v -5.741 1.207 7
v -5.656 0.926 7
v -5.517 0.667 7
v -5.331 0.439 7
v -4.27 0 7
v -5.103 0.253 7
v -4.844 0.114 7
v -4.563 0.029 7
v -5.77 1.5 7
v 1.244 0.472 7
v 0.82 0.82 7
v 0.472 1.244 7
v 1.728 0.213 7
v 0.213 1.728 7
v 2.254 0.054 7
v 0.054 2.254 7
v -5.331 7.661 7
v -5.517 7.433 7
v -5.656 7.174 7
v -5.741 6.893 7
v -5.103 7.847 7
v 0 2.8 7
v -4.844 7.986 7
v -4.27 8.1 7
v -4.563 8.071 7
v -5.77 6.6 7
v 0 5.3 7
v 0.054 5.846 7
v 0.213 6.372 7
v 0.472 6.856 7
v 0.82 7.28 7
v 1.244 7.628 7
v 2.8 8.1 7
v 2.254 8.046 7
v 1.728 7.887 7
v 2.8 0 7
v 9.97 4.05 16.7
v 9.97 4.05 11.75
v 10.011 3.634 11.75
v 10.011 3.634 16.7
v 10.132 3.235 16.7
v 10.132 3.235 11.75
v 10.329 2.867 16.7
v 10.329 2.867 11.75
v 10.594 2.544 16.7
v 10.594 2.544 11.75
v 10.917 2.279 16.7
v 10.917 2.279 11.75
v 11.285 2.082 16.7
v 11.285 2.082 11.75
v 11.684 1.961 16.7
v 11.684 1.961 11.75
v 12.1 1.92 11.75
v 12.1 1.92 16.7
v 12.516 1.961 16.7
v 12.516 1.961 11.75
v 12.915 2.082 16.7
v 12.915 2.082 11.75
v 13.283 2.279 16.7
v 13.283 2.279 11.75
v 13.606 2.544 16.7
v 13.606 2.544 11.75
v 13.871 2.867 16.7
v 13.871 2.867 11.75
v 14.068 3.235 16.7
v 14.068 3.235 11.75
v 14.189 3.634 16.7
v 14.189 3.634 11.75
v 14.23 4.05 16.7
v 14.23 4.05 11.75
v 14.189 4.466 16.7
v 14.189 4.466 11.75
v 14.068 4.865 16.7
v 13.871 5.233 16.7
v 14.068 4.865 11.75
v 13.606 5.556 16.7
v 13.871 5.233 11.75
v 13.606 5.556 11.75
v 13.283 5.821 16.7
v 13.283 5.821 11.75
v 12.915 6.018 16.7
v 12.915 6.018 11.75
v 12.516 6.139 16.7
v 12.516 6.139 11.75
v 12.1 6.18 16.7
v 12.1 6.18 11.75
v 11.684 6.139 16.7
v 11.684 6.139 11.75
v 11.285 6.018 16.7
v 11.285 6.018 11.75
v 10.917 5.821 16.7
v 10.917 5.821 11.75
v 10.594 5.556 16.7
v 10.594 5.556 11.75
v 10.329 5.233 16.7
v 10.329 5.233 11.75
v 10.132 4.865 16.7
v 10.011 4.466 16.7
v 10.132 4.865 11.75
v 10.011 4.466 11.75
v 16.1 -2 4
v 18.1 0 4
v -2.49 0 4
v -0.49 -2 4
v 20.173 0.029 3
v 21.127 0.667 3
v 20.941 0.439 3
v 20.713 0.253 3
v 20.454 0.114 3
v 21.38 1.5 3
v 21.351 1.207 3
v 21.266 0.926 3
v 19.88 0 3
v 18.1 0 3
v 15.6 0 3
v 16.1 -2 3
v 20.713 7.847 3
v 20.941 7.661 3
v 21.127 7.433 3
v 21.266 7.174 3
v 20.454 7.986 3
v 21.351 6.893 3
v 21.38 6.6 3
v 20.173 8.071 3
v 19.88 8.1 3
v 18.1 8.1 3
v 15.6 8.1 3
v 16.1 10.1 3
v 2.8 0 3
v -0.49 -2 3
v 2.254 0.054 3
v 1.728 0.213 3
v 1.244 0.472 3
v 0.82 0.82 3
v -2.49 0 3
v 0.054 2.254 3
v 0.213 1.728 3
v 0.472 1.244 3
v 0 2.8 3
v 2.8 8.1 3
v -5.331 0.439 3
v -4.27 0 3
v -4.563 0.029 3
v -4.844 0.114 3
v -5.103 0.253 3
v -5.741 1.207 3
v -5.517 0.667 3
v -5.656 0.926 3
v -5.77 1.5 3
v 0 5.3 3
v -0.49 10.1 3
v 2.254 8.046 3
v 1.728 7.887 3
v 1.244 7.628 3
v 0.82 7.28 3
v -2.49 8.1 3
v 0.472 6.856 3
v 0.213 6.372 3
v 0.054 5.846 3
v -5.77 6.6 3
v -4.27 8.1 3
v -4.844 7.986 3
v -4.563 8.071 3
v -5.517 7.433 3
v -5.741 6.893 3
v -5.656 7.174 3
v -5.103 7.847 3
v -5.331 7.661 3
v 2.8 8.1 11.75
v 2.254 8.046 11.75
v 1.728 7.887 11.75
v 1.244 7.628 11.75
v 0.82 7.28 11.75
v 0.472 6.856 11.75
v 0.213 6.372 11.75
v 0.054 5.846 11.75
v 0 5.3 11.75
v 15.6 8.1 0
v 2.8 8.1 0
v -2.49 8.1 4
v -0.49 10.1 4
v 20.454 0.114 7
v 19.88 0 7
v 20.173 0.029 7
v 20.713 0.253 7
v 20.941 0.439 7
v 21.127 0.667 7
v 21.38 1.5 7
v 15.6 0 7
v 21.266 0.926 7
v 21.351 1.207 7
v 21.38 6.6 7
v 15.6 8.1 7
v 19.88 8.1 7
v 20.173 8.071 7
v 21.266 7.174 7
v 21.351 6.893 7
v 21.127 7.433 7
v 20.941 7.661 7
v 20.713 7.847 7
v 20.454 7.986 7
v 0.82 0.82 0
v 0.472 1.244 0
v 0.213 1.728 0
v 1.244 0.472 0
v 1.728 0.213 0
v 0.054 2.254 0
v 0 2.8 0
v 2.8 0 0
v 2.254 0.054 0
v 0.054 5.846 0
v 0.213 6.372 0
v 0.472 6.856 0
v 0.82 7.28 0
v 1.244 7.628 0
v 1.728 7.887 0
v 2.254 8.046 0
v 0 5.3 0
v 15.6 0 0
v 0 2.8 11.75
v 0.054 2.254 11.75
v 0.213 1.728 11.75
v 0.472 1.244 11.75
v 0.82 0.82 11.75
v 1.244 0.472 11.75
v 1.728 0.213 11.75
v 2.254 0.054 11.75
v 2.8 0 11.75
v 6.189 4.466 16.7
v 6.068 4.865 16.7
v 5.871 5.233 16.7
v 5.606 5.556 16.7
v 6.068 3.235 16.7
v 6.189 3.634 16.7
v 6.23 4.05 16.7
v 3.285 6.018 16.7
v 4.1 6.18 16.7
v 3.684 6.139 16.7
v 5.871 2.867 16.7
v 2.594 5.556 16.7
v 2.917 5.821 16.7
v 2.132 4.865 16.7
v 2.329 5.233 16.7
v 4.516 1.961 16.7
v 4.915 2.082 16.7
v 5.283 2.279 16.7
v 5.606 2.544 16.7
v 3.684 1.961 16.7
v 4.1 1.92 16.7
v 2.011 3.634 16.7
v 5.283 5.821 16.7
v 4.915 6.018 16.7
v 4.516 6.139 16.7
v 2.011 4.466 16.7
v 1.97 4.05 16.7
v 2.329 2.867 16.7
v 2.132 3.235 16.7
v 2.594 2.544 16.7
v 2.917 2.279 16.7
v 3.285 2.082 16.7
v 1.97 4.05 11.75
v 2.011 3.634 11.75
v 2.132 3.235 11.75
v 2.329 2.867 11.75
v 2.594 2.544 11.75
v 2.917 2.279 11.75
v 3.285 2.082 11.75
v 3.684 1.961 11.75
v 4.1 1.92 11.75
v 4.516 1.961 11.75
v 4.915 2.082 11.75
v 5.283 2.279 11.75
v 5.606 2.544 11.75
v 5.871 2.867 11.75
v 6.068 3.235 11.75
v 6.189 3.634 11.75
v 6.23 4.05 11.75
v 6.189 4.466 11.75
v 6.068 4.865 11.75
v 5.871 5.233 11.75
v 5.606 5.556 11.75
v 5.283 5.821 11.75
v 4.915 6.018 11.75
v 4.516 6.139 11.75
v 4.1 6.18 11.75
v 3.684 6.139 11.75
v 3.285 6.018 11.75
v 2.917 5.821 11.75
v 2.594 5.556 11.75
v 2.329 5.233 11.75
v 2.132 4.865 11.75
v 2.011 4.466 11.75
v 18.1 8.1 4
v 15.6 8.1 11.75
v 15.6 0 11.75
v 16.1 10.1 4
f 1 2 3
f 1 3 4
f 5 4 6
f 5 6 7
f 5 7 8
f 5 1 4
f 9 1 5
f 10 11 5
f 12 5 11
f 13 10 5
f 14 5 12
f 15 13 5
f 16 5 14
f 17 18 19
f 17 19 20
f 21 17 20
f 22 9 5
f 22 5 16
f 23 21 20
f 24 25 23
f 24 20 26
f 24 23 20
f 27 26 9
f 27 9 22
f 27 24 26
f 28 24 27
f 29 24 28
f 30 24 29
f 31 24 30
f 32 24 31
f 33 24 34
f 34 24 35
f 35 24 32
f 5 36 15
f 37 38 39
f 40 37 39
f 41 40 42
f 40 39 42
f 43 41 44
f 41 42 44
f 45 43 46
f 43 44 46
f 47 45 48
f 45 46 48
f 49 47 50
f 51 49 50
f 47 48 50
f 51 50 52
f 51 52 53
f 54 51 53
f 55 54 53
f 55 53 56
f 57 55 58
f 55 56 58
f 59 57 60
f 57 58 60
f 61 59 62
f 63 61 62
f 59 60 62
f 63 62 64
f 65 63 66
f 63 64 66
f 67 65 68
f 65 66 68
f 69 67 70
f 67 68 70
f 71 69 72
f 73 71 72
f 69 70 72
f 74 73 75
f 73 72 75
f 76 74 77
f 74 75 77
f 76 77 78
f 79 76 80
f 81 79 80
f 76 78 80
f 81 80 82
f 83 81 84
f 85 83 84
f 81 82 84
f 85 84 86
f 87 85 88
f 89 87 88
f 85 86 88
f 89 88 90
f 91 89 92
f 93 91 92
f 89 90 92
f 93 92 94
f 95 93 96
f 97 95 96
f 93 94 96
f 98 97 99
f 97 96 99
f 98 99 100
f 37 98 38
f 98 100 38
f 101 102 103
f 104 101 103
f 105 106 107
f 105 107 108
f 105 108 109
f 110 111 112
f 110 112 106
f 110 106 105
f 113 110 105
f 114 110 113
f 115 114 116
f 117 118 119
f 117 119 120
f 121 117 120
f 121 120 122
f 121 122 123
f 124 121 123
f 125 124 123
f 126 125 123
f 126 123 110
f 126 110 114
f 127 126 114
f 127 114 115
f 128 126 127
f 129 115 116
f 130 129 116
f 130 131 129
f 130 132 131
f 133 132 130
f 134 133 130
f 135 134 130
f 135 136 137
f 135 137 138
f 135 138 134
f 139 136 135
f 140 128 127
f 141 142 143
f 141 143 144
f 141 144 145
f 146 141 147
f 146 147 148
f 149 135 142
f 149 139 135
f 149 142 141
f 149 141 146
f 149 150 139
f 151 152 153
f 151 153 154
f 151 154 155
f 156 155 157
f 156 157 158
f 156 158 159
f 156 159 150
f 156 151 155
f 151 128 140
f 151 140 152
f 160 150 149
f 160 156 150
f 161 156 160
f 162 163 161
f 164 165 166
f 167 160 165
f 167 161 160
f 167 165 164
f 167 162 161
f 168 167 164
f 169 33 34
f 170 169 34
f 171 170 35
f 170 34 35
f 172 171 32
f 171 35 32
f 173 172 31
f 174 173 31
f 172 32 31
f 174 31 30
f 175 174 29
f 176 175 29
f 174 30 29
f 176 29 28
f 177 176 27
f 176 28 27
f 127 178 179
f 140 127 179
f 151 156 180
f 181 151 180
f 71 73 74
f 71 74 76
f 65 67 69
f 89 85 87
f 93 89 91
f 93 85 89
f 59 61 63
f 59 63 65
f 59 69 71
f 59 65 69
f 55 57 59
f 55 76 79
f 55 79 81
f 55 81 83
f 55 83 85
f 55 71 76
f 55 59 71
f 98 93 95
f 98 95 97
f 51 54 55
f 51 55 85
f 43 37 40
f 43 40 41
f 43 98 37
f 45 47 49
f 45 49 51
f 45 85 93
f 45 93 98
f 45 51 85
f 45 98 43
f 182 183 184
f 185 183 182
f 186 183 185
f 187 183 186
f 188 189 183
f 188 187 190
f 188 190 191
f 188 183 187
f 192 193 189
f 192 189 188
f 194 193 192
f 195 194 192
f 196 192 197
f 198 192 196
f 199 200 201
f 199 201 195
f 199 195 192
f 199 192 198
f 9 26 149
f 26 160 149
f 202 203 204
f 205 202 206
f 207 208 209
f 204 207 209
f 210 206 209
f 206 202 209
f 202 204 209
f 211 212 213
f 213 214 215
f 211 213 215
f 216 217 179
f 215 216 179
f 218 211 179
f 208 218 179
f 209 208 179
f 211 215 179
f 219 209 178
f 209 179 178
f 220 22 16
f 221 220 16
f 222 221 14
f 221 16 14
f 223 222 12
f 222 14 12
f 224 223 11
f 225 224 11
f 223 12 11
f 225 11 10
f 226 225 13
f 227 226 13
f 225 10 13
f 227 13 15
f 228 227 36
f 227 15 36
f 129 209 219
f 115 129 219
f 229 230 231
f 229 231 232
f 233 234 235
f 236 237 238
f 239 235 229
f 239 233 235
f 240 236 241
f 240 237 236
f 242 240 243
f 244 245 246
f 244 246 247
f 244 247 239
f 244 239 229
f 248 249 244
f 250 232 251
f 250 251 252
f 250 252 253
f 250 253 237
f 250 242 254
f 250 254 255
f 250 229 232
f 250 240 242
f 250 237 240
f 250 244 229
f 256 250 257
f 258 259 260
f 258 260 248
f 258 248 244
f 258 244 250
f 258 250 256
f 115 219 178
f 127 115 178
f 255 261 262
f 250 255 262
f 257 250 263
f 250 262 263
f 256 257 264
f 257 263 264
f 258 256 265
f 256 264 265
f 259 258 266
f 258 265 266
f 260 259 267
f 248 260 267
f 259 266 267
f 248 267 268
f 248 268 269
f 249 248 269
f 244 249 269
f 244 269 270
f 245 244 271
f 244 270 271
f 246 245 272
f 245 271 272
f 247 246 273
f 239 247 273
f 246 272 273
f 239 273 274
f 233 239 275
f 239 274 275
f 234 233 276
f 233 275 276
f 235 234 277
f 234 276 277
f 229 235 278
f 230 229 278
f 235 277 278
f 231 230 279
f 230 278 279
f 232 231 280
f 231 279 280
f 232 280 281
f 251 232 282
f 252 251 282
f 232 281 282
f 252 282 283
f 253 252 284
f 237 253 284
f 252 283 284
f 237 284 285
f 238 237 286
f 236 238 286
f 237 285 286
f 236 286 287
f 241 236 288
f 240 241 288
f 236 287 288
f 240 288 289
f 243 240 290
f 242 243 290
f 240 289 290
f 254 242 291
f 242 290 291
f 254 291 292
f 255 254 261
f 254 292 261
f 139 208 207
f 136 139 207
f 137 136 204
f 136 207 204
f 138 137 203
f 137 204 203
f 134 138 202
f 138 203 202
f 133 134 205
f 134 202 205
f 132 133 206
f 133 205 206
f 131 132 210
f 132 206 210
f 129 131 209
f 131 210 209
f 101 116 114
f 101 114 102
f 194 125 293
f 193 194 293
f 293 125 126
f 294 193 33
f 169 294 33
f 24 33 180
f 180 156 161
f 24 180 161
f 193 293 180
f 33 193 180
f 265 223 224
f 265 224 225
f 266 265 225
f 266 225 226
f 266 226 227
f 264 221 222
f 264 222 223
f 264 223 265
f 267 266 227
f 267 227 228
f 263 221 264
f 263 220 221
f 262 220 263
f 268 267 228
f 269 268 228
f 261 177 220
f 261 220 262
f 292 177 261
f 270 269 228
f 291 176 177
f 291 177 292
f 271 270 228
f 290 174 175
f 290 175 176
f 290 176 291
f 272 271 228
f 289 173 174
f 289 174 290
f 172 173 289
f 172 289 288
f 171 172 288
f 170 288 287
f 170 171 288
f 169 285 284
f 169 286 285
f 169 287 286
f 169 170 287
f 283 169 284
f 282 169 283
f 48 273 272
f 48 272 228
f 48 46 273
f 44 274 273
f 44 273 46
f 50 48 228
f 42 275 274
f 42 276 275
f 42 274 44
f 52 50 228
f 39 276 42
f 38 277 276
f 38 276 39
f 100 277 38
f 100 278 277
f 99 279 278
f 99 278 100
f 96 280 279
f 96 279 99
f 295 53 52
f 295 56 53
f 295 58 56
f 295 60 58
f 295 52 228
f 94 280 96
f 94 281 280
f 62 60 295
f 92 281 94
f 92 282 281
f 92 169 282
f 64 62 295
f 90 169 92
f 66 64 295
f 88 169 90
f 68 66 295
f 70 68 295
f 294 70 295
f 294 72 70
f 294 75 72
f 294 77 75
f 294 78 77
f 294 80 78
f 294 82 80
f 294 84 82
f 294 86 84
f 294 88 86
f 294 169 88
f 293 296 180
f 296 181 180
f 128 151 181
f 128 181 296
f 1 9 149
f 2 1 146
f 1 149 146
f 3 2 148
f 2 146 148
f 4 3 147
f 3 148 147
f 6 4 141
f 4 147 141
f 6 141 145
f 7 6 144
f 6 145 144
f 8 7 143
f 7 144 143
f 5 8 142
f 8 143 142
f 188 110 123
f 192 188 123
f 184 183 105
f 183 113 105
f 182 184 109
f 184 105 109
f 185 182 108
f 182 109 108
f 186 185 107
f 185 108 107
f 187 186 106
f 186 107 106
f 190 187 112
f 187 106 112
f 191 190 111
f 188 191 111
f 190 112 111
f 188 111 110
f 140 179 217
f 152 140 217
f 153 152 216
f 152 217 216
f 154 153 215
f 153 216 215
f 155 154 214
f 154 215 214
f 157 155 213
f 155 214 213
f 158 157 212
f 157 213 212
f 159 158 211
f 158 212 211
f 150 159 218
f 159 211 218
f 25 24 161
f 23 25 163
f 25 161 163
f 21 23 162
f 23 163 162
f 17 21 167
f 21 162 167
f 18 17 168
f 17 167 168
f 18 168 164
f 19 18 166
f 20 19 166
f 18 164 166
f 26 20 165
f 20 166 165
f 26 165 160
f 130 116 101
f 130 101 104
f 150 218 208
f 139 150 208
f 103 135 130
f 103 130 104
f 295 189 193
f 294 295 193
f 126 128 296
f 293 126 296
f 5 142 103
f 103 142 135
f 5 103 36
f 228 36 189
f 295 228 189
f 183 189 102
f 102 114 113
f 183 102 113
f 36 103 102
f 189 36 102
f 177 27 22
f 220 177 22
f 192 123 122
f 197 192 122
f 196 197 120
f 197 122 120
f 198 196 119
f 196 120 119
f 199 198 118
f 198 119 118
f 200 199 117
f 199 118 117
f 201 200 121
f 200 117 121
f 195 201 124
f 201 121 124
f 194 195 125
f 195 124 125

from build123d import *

# Parameters (mm, degrees)
DODANIE_WYCI_GNI_CIE1_DEPTH = 3
DODANIE_WYCI_GNI_CIE2_DEPTH = 1
SFAZOWANIE1_SIZE            = 2
DODANIE_WYCI_GNI_CIE3_DEPTH = 3
DODANIE_WYCI_GNI_CIE4_START = 7
DODANIE_WYCI_GNI_CIE4_DEPTH = 4.75
SZKIC6_R                    = 2.13
DODANIE_WYCI_GNI_CIE5_DEPTH = 4.95


with BuildPart() as part:
    # Szkic1 → Dodanie-wyciągnięcie1 (new body)
    with BuildSketch(Plane.XY):
        with BuildLine():
            Line((2.8, 0), (15.6, 0))
            Line((15.6, 0), (15.6, 8.1))
            Line((15.6, 8.1), (2.8, 8.1))
            ThreePointArc((2.8, 8.1), (0.820101013, 7.279898987), (0, 5.3))
            Line((0, 5.3), (0, 2.8))
            ThreePointArc((0, 2.8), (0.820101013, 0.820101013), (2.8, 0))
        make_face()
    extrude(amount=DODANIE_WYCI_GNI_CIE1_DEPTH)

    # Szkic2 → Dodanie-wyciągnięcie2 (add)
    with BuildSketch(Plane.XY.offset(3)):
        with BuildLine():
            Line((-0.49, 10.1), (16.1, 10.1))
            Line((16.1, 10.1), (16.1, 8.1))
            Line((16.1, 8.1), (19.88, 8.1))
            ThreePointArc((19.88, 8.1), (20.940660172, 7.660660172), (21.38, 6.6))
            Line((21.38, 6.6), (21.38, 1.5))
            ThreePointArc((21.38, 1.5), (20.940660172, 0.439339828), (19.88, 0))
            Line((19.88, 0), (16.1, 0))
            Line((16.1, 0), (16.1, -2))
            Line((16.1, -2), (-0.49, -2))
            Line((-0.49, -2), (-0.49, 0))
            Line((-0.49, 0), (-4.27, 0))
            ThreePointArc((-4.27, 0), (-5.330660172, 0.439339828), (-5.77, 1.5))
            Line((-5.77, 1.5), (-5.77, 6.6))
            ThreePointArc((-5.77, 6.6), (-5.330660172, 7.660660172), (-4.27, 8.1))
            Line((-4.27, 8.1), (-0.49, 8.1))
            Line((-0.49, 8.1), (-0.49, 10.1))
        make_face()
    extrude(amount=DODANIE_WYCI_GNI_CIE2_DEPTH)

    # Sfazowanie1
    sfazowanie1_edges = [part.edges().sort_by_distance(p)[0] for p in [
        (16.1, 8.1, 3.5),
        (16.1, 0, 3.5),
        (-0.49, 0, 3.5),
        (-0.49, 8.1, 3.5),
    ]]
    chamfer(sfazowanie1_edges, length=SFAZOWANIE1_SIZE - 0.0001)  # a hair under: the kernel refuses the full size

    # Szkic4 → Dodanie-wyciągnięcie3 (add)
    with BuildSketch(Plane.XY.offset(4)):
        with BuildLine():
            Line((19.88, 8.1), (18.1, 8.1))
            Line((18.1, 8.1), (-2.49, 8.1))
            Line((-2.49, 8.1), (-4.27, 8.1))
            ThreePointArc((-4.27, 8.1), (-5.330660172, 7.660660172), (-5.77, 6.6))
            Line((-5.77, 6.6), (-5.77, 1.5))
            ThreePointArc((-5.77, 1.5), (-5.330660172, 0.439339828), (-4.27, 0))
            Line((-4.27, 0), (-2.49, 0))
            Line((-2.49, 0), (18.1, 0))
            Line((18.1, 0), (19.88, 0))
            ThreePointArc((19.88, 0), (20.940660172, 0.439339828), (21.38, 1.5))
            Line((21.38, 1.5), (21.38, 6.6))
            ThreePointArc((21.38, 6.6), (20.940660172, 7.660660172), (19.88, 8.1))
        make_face()
    extrude(amount=DODANIE_WYCI_GNI_CIE3_DEPTH)

    # Szkic1<2> → Dodanie-wyciągnięcie4 (add)
    with BuildSketch(Plane.XY.offset(DODANIE_WYCI_GNI_CIE4_START)):
        with BuildLine():
            Line((2.8, 0), (15.6, 0))
            Line((15.6, 0), (15.6, 8.1))
            Line((15.6, 8.1), (2.8, 8.1))
            ThreePointArc((2.8, 8.1), (0.820101013, 7.279898987), (0, 5.3))
            Line((0, 5.3), (0, 2.8))
            ThreePointArc((0, 2.8), (0.820101013, 0.820101013), (2.8, 0))
        make_face()
    extrude(amount=DODANIE_WYCI_GNI_CIE4_DEPTH)

    # Szkic6 → Dodanie-wyciągnięcie5 (add)
    with BuildSketch(Plane.XY.offset(11.75)):
        with Locations(Location((4.1, 4.05, 0), (0, 0, 180))):
            Circle(SZKIC6_R)
        with Locations(Location((12.1, 4.05, 0), (0, 0, 180))):
            Circle(SZKIC6_R)
    extrude(amount=DODANIE_WYCI_GNI_CIE5_DEPTH)


solid = part.part
